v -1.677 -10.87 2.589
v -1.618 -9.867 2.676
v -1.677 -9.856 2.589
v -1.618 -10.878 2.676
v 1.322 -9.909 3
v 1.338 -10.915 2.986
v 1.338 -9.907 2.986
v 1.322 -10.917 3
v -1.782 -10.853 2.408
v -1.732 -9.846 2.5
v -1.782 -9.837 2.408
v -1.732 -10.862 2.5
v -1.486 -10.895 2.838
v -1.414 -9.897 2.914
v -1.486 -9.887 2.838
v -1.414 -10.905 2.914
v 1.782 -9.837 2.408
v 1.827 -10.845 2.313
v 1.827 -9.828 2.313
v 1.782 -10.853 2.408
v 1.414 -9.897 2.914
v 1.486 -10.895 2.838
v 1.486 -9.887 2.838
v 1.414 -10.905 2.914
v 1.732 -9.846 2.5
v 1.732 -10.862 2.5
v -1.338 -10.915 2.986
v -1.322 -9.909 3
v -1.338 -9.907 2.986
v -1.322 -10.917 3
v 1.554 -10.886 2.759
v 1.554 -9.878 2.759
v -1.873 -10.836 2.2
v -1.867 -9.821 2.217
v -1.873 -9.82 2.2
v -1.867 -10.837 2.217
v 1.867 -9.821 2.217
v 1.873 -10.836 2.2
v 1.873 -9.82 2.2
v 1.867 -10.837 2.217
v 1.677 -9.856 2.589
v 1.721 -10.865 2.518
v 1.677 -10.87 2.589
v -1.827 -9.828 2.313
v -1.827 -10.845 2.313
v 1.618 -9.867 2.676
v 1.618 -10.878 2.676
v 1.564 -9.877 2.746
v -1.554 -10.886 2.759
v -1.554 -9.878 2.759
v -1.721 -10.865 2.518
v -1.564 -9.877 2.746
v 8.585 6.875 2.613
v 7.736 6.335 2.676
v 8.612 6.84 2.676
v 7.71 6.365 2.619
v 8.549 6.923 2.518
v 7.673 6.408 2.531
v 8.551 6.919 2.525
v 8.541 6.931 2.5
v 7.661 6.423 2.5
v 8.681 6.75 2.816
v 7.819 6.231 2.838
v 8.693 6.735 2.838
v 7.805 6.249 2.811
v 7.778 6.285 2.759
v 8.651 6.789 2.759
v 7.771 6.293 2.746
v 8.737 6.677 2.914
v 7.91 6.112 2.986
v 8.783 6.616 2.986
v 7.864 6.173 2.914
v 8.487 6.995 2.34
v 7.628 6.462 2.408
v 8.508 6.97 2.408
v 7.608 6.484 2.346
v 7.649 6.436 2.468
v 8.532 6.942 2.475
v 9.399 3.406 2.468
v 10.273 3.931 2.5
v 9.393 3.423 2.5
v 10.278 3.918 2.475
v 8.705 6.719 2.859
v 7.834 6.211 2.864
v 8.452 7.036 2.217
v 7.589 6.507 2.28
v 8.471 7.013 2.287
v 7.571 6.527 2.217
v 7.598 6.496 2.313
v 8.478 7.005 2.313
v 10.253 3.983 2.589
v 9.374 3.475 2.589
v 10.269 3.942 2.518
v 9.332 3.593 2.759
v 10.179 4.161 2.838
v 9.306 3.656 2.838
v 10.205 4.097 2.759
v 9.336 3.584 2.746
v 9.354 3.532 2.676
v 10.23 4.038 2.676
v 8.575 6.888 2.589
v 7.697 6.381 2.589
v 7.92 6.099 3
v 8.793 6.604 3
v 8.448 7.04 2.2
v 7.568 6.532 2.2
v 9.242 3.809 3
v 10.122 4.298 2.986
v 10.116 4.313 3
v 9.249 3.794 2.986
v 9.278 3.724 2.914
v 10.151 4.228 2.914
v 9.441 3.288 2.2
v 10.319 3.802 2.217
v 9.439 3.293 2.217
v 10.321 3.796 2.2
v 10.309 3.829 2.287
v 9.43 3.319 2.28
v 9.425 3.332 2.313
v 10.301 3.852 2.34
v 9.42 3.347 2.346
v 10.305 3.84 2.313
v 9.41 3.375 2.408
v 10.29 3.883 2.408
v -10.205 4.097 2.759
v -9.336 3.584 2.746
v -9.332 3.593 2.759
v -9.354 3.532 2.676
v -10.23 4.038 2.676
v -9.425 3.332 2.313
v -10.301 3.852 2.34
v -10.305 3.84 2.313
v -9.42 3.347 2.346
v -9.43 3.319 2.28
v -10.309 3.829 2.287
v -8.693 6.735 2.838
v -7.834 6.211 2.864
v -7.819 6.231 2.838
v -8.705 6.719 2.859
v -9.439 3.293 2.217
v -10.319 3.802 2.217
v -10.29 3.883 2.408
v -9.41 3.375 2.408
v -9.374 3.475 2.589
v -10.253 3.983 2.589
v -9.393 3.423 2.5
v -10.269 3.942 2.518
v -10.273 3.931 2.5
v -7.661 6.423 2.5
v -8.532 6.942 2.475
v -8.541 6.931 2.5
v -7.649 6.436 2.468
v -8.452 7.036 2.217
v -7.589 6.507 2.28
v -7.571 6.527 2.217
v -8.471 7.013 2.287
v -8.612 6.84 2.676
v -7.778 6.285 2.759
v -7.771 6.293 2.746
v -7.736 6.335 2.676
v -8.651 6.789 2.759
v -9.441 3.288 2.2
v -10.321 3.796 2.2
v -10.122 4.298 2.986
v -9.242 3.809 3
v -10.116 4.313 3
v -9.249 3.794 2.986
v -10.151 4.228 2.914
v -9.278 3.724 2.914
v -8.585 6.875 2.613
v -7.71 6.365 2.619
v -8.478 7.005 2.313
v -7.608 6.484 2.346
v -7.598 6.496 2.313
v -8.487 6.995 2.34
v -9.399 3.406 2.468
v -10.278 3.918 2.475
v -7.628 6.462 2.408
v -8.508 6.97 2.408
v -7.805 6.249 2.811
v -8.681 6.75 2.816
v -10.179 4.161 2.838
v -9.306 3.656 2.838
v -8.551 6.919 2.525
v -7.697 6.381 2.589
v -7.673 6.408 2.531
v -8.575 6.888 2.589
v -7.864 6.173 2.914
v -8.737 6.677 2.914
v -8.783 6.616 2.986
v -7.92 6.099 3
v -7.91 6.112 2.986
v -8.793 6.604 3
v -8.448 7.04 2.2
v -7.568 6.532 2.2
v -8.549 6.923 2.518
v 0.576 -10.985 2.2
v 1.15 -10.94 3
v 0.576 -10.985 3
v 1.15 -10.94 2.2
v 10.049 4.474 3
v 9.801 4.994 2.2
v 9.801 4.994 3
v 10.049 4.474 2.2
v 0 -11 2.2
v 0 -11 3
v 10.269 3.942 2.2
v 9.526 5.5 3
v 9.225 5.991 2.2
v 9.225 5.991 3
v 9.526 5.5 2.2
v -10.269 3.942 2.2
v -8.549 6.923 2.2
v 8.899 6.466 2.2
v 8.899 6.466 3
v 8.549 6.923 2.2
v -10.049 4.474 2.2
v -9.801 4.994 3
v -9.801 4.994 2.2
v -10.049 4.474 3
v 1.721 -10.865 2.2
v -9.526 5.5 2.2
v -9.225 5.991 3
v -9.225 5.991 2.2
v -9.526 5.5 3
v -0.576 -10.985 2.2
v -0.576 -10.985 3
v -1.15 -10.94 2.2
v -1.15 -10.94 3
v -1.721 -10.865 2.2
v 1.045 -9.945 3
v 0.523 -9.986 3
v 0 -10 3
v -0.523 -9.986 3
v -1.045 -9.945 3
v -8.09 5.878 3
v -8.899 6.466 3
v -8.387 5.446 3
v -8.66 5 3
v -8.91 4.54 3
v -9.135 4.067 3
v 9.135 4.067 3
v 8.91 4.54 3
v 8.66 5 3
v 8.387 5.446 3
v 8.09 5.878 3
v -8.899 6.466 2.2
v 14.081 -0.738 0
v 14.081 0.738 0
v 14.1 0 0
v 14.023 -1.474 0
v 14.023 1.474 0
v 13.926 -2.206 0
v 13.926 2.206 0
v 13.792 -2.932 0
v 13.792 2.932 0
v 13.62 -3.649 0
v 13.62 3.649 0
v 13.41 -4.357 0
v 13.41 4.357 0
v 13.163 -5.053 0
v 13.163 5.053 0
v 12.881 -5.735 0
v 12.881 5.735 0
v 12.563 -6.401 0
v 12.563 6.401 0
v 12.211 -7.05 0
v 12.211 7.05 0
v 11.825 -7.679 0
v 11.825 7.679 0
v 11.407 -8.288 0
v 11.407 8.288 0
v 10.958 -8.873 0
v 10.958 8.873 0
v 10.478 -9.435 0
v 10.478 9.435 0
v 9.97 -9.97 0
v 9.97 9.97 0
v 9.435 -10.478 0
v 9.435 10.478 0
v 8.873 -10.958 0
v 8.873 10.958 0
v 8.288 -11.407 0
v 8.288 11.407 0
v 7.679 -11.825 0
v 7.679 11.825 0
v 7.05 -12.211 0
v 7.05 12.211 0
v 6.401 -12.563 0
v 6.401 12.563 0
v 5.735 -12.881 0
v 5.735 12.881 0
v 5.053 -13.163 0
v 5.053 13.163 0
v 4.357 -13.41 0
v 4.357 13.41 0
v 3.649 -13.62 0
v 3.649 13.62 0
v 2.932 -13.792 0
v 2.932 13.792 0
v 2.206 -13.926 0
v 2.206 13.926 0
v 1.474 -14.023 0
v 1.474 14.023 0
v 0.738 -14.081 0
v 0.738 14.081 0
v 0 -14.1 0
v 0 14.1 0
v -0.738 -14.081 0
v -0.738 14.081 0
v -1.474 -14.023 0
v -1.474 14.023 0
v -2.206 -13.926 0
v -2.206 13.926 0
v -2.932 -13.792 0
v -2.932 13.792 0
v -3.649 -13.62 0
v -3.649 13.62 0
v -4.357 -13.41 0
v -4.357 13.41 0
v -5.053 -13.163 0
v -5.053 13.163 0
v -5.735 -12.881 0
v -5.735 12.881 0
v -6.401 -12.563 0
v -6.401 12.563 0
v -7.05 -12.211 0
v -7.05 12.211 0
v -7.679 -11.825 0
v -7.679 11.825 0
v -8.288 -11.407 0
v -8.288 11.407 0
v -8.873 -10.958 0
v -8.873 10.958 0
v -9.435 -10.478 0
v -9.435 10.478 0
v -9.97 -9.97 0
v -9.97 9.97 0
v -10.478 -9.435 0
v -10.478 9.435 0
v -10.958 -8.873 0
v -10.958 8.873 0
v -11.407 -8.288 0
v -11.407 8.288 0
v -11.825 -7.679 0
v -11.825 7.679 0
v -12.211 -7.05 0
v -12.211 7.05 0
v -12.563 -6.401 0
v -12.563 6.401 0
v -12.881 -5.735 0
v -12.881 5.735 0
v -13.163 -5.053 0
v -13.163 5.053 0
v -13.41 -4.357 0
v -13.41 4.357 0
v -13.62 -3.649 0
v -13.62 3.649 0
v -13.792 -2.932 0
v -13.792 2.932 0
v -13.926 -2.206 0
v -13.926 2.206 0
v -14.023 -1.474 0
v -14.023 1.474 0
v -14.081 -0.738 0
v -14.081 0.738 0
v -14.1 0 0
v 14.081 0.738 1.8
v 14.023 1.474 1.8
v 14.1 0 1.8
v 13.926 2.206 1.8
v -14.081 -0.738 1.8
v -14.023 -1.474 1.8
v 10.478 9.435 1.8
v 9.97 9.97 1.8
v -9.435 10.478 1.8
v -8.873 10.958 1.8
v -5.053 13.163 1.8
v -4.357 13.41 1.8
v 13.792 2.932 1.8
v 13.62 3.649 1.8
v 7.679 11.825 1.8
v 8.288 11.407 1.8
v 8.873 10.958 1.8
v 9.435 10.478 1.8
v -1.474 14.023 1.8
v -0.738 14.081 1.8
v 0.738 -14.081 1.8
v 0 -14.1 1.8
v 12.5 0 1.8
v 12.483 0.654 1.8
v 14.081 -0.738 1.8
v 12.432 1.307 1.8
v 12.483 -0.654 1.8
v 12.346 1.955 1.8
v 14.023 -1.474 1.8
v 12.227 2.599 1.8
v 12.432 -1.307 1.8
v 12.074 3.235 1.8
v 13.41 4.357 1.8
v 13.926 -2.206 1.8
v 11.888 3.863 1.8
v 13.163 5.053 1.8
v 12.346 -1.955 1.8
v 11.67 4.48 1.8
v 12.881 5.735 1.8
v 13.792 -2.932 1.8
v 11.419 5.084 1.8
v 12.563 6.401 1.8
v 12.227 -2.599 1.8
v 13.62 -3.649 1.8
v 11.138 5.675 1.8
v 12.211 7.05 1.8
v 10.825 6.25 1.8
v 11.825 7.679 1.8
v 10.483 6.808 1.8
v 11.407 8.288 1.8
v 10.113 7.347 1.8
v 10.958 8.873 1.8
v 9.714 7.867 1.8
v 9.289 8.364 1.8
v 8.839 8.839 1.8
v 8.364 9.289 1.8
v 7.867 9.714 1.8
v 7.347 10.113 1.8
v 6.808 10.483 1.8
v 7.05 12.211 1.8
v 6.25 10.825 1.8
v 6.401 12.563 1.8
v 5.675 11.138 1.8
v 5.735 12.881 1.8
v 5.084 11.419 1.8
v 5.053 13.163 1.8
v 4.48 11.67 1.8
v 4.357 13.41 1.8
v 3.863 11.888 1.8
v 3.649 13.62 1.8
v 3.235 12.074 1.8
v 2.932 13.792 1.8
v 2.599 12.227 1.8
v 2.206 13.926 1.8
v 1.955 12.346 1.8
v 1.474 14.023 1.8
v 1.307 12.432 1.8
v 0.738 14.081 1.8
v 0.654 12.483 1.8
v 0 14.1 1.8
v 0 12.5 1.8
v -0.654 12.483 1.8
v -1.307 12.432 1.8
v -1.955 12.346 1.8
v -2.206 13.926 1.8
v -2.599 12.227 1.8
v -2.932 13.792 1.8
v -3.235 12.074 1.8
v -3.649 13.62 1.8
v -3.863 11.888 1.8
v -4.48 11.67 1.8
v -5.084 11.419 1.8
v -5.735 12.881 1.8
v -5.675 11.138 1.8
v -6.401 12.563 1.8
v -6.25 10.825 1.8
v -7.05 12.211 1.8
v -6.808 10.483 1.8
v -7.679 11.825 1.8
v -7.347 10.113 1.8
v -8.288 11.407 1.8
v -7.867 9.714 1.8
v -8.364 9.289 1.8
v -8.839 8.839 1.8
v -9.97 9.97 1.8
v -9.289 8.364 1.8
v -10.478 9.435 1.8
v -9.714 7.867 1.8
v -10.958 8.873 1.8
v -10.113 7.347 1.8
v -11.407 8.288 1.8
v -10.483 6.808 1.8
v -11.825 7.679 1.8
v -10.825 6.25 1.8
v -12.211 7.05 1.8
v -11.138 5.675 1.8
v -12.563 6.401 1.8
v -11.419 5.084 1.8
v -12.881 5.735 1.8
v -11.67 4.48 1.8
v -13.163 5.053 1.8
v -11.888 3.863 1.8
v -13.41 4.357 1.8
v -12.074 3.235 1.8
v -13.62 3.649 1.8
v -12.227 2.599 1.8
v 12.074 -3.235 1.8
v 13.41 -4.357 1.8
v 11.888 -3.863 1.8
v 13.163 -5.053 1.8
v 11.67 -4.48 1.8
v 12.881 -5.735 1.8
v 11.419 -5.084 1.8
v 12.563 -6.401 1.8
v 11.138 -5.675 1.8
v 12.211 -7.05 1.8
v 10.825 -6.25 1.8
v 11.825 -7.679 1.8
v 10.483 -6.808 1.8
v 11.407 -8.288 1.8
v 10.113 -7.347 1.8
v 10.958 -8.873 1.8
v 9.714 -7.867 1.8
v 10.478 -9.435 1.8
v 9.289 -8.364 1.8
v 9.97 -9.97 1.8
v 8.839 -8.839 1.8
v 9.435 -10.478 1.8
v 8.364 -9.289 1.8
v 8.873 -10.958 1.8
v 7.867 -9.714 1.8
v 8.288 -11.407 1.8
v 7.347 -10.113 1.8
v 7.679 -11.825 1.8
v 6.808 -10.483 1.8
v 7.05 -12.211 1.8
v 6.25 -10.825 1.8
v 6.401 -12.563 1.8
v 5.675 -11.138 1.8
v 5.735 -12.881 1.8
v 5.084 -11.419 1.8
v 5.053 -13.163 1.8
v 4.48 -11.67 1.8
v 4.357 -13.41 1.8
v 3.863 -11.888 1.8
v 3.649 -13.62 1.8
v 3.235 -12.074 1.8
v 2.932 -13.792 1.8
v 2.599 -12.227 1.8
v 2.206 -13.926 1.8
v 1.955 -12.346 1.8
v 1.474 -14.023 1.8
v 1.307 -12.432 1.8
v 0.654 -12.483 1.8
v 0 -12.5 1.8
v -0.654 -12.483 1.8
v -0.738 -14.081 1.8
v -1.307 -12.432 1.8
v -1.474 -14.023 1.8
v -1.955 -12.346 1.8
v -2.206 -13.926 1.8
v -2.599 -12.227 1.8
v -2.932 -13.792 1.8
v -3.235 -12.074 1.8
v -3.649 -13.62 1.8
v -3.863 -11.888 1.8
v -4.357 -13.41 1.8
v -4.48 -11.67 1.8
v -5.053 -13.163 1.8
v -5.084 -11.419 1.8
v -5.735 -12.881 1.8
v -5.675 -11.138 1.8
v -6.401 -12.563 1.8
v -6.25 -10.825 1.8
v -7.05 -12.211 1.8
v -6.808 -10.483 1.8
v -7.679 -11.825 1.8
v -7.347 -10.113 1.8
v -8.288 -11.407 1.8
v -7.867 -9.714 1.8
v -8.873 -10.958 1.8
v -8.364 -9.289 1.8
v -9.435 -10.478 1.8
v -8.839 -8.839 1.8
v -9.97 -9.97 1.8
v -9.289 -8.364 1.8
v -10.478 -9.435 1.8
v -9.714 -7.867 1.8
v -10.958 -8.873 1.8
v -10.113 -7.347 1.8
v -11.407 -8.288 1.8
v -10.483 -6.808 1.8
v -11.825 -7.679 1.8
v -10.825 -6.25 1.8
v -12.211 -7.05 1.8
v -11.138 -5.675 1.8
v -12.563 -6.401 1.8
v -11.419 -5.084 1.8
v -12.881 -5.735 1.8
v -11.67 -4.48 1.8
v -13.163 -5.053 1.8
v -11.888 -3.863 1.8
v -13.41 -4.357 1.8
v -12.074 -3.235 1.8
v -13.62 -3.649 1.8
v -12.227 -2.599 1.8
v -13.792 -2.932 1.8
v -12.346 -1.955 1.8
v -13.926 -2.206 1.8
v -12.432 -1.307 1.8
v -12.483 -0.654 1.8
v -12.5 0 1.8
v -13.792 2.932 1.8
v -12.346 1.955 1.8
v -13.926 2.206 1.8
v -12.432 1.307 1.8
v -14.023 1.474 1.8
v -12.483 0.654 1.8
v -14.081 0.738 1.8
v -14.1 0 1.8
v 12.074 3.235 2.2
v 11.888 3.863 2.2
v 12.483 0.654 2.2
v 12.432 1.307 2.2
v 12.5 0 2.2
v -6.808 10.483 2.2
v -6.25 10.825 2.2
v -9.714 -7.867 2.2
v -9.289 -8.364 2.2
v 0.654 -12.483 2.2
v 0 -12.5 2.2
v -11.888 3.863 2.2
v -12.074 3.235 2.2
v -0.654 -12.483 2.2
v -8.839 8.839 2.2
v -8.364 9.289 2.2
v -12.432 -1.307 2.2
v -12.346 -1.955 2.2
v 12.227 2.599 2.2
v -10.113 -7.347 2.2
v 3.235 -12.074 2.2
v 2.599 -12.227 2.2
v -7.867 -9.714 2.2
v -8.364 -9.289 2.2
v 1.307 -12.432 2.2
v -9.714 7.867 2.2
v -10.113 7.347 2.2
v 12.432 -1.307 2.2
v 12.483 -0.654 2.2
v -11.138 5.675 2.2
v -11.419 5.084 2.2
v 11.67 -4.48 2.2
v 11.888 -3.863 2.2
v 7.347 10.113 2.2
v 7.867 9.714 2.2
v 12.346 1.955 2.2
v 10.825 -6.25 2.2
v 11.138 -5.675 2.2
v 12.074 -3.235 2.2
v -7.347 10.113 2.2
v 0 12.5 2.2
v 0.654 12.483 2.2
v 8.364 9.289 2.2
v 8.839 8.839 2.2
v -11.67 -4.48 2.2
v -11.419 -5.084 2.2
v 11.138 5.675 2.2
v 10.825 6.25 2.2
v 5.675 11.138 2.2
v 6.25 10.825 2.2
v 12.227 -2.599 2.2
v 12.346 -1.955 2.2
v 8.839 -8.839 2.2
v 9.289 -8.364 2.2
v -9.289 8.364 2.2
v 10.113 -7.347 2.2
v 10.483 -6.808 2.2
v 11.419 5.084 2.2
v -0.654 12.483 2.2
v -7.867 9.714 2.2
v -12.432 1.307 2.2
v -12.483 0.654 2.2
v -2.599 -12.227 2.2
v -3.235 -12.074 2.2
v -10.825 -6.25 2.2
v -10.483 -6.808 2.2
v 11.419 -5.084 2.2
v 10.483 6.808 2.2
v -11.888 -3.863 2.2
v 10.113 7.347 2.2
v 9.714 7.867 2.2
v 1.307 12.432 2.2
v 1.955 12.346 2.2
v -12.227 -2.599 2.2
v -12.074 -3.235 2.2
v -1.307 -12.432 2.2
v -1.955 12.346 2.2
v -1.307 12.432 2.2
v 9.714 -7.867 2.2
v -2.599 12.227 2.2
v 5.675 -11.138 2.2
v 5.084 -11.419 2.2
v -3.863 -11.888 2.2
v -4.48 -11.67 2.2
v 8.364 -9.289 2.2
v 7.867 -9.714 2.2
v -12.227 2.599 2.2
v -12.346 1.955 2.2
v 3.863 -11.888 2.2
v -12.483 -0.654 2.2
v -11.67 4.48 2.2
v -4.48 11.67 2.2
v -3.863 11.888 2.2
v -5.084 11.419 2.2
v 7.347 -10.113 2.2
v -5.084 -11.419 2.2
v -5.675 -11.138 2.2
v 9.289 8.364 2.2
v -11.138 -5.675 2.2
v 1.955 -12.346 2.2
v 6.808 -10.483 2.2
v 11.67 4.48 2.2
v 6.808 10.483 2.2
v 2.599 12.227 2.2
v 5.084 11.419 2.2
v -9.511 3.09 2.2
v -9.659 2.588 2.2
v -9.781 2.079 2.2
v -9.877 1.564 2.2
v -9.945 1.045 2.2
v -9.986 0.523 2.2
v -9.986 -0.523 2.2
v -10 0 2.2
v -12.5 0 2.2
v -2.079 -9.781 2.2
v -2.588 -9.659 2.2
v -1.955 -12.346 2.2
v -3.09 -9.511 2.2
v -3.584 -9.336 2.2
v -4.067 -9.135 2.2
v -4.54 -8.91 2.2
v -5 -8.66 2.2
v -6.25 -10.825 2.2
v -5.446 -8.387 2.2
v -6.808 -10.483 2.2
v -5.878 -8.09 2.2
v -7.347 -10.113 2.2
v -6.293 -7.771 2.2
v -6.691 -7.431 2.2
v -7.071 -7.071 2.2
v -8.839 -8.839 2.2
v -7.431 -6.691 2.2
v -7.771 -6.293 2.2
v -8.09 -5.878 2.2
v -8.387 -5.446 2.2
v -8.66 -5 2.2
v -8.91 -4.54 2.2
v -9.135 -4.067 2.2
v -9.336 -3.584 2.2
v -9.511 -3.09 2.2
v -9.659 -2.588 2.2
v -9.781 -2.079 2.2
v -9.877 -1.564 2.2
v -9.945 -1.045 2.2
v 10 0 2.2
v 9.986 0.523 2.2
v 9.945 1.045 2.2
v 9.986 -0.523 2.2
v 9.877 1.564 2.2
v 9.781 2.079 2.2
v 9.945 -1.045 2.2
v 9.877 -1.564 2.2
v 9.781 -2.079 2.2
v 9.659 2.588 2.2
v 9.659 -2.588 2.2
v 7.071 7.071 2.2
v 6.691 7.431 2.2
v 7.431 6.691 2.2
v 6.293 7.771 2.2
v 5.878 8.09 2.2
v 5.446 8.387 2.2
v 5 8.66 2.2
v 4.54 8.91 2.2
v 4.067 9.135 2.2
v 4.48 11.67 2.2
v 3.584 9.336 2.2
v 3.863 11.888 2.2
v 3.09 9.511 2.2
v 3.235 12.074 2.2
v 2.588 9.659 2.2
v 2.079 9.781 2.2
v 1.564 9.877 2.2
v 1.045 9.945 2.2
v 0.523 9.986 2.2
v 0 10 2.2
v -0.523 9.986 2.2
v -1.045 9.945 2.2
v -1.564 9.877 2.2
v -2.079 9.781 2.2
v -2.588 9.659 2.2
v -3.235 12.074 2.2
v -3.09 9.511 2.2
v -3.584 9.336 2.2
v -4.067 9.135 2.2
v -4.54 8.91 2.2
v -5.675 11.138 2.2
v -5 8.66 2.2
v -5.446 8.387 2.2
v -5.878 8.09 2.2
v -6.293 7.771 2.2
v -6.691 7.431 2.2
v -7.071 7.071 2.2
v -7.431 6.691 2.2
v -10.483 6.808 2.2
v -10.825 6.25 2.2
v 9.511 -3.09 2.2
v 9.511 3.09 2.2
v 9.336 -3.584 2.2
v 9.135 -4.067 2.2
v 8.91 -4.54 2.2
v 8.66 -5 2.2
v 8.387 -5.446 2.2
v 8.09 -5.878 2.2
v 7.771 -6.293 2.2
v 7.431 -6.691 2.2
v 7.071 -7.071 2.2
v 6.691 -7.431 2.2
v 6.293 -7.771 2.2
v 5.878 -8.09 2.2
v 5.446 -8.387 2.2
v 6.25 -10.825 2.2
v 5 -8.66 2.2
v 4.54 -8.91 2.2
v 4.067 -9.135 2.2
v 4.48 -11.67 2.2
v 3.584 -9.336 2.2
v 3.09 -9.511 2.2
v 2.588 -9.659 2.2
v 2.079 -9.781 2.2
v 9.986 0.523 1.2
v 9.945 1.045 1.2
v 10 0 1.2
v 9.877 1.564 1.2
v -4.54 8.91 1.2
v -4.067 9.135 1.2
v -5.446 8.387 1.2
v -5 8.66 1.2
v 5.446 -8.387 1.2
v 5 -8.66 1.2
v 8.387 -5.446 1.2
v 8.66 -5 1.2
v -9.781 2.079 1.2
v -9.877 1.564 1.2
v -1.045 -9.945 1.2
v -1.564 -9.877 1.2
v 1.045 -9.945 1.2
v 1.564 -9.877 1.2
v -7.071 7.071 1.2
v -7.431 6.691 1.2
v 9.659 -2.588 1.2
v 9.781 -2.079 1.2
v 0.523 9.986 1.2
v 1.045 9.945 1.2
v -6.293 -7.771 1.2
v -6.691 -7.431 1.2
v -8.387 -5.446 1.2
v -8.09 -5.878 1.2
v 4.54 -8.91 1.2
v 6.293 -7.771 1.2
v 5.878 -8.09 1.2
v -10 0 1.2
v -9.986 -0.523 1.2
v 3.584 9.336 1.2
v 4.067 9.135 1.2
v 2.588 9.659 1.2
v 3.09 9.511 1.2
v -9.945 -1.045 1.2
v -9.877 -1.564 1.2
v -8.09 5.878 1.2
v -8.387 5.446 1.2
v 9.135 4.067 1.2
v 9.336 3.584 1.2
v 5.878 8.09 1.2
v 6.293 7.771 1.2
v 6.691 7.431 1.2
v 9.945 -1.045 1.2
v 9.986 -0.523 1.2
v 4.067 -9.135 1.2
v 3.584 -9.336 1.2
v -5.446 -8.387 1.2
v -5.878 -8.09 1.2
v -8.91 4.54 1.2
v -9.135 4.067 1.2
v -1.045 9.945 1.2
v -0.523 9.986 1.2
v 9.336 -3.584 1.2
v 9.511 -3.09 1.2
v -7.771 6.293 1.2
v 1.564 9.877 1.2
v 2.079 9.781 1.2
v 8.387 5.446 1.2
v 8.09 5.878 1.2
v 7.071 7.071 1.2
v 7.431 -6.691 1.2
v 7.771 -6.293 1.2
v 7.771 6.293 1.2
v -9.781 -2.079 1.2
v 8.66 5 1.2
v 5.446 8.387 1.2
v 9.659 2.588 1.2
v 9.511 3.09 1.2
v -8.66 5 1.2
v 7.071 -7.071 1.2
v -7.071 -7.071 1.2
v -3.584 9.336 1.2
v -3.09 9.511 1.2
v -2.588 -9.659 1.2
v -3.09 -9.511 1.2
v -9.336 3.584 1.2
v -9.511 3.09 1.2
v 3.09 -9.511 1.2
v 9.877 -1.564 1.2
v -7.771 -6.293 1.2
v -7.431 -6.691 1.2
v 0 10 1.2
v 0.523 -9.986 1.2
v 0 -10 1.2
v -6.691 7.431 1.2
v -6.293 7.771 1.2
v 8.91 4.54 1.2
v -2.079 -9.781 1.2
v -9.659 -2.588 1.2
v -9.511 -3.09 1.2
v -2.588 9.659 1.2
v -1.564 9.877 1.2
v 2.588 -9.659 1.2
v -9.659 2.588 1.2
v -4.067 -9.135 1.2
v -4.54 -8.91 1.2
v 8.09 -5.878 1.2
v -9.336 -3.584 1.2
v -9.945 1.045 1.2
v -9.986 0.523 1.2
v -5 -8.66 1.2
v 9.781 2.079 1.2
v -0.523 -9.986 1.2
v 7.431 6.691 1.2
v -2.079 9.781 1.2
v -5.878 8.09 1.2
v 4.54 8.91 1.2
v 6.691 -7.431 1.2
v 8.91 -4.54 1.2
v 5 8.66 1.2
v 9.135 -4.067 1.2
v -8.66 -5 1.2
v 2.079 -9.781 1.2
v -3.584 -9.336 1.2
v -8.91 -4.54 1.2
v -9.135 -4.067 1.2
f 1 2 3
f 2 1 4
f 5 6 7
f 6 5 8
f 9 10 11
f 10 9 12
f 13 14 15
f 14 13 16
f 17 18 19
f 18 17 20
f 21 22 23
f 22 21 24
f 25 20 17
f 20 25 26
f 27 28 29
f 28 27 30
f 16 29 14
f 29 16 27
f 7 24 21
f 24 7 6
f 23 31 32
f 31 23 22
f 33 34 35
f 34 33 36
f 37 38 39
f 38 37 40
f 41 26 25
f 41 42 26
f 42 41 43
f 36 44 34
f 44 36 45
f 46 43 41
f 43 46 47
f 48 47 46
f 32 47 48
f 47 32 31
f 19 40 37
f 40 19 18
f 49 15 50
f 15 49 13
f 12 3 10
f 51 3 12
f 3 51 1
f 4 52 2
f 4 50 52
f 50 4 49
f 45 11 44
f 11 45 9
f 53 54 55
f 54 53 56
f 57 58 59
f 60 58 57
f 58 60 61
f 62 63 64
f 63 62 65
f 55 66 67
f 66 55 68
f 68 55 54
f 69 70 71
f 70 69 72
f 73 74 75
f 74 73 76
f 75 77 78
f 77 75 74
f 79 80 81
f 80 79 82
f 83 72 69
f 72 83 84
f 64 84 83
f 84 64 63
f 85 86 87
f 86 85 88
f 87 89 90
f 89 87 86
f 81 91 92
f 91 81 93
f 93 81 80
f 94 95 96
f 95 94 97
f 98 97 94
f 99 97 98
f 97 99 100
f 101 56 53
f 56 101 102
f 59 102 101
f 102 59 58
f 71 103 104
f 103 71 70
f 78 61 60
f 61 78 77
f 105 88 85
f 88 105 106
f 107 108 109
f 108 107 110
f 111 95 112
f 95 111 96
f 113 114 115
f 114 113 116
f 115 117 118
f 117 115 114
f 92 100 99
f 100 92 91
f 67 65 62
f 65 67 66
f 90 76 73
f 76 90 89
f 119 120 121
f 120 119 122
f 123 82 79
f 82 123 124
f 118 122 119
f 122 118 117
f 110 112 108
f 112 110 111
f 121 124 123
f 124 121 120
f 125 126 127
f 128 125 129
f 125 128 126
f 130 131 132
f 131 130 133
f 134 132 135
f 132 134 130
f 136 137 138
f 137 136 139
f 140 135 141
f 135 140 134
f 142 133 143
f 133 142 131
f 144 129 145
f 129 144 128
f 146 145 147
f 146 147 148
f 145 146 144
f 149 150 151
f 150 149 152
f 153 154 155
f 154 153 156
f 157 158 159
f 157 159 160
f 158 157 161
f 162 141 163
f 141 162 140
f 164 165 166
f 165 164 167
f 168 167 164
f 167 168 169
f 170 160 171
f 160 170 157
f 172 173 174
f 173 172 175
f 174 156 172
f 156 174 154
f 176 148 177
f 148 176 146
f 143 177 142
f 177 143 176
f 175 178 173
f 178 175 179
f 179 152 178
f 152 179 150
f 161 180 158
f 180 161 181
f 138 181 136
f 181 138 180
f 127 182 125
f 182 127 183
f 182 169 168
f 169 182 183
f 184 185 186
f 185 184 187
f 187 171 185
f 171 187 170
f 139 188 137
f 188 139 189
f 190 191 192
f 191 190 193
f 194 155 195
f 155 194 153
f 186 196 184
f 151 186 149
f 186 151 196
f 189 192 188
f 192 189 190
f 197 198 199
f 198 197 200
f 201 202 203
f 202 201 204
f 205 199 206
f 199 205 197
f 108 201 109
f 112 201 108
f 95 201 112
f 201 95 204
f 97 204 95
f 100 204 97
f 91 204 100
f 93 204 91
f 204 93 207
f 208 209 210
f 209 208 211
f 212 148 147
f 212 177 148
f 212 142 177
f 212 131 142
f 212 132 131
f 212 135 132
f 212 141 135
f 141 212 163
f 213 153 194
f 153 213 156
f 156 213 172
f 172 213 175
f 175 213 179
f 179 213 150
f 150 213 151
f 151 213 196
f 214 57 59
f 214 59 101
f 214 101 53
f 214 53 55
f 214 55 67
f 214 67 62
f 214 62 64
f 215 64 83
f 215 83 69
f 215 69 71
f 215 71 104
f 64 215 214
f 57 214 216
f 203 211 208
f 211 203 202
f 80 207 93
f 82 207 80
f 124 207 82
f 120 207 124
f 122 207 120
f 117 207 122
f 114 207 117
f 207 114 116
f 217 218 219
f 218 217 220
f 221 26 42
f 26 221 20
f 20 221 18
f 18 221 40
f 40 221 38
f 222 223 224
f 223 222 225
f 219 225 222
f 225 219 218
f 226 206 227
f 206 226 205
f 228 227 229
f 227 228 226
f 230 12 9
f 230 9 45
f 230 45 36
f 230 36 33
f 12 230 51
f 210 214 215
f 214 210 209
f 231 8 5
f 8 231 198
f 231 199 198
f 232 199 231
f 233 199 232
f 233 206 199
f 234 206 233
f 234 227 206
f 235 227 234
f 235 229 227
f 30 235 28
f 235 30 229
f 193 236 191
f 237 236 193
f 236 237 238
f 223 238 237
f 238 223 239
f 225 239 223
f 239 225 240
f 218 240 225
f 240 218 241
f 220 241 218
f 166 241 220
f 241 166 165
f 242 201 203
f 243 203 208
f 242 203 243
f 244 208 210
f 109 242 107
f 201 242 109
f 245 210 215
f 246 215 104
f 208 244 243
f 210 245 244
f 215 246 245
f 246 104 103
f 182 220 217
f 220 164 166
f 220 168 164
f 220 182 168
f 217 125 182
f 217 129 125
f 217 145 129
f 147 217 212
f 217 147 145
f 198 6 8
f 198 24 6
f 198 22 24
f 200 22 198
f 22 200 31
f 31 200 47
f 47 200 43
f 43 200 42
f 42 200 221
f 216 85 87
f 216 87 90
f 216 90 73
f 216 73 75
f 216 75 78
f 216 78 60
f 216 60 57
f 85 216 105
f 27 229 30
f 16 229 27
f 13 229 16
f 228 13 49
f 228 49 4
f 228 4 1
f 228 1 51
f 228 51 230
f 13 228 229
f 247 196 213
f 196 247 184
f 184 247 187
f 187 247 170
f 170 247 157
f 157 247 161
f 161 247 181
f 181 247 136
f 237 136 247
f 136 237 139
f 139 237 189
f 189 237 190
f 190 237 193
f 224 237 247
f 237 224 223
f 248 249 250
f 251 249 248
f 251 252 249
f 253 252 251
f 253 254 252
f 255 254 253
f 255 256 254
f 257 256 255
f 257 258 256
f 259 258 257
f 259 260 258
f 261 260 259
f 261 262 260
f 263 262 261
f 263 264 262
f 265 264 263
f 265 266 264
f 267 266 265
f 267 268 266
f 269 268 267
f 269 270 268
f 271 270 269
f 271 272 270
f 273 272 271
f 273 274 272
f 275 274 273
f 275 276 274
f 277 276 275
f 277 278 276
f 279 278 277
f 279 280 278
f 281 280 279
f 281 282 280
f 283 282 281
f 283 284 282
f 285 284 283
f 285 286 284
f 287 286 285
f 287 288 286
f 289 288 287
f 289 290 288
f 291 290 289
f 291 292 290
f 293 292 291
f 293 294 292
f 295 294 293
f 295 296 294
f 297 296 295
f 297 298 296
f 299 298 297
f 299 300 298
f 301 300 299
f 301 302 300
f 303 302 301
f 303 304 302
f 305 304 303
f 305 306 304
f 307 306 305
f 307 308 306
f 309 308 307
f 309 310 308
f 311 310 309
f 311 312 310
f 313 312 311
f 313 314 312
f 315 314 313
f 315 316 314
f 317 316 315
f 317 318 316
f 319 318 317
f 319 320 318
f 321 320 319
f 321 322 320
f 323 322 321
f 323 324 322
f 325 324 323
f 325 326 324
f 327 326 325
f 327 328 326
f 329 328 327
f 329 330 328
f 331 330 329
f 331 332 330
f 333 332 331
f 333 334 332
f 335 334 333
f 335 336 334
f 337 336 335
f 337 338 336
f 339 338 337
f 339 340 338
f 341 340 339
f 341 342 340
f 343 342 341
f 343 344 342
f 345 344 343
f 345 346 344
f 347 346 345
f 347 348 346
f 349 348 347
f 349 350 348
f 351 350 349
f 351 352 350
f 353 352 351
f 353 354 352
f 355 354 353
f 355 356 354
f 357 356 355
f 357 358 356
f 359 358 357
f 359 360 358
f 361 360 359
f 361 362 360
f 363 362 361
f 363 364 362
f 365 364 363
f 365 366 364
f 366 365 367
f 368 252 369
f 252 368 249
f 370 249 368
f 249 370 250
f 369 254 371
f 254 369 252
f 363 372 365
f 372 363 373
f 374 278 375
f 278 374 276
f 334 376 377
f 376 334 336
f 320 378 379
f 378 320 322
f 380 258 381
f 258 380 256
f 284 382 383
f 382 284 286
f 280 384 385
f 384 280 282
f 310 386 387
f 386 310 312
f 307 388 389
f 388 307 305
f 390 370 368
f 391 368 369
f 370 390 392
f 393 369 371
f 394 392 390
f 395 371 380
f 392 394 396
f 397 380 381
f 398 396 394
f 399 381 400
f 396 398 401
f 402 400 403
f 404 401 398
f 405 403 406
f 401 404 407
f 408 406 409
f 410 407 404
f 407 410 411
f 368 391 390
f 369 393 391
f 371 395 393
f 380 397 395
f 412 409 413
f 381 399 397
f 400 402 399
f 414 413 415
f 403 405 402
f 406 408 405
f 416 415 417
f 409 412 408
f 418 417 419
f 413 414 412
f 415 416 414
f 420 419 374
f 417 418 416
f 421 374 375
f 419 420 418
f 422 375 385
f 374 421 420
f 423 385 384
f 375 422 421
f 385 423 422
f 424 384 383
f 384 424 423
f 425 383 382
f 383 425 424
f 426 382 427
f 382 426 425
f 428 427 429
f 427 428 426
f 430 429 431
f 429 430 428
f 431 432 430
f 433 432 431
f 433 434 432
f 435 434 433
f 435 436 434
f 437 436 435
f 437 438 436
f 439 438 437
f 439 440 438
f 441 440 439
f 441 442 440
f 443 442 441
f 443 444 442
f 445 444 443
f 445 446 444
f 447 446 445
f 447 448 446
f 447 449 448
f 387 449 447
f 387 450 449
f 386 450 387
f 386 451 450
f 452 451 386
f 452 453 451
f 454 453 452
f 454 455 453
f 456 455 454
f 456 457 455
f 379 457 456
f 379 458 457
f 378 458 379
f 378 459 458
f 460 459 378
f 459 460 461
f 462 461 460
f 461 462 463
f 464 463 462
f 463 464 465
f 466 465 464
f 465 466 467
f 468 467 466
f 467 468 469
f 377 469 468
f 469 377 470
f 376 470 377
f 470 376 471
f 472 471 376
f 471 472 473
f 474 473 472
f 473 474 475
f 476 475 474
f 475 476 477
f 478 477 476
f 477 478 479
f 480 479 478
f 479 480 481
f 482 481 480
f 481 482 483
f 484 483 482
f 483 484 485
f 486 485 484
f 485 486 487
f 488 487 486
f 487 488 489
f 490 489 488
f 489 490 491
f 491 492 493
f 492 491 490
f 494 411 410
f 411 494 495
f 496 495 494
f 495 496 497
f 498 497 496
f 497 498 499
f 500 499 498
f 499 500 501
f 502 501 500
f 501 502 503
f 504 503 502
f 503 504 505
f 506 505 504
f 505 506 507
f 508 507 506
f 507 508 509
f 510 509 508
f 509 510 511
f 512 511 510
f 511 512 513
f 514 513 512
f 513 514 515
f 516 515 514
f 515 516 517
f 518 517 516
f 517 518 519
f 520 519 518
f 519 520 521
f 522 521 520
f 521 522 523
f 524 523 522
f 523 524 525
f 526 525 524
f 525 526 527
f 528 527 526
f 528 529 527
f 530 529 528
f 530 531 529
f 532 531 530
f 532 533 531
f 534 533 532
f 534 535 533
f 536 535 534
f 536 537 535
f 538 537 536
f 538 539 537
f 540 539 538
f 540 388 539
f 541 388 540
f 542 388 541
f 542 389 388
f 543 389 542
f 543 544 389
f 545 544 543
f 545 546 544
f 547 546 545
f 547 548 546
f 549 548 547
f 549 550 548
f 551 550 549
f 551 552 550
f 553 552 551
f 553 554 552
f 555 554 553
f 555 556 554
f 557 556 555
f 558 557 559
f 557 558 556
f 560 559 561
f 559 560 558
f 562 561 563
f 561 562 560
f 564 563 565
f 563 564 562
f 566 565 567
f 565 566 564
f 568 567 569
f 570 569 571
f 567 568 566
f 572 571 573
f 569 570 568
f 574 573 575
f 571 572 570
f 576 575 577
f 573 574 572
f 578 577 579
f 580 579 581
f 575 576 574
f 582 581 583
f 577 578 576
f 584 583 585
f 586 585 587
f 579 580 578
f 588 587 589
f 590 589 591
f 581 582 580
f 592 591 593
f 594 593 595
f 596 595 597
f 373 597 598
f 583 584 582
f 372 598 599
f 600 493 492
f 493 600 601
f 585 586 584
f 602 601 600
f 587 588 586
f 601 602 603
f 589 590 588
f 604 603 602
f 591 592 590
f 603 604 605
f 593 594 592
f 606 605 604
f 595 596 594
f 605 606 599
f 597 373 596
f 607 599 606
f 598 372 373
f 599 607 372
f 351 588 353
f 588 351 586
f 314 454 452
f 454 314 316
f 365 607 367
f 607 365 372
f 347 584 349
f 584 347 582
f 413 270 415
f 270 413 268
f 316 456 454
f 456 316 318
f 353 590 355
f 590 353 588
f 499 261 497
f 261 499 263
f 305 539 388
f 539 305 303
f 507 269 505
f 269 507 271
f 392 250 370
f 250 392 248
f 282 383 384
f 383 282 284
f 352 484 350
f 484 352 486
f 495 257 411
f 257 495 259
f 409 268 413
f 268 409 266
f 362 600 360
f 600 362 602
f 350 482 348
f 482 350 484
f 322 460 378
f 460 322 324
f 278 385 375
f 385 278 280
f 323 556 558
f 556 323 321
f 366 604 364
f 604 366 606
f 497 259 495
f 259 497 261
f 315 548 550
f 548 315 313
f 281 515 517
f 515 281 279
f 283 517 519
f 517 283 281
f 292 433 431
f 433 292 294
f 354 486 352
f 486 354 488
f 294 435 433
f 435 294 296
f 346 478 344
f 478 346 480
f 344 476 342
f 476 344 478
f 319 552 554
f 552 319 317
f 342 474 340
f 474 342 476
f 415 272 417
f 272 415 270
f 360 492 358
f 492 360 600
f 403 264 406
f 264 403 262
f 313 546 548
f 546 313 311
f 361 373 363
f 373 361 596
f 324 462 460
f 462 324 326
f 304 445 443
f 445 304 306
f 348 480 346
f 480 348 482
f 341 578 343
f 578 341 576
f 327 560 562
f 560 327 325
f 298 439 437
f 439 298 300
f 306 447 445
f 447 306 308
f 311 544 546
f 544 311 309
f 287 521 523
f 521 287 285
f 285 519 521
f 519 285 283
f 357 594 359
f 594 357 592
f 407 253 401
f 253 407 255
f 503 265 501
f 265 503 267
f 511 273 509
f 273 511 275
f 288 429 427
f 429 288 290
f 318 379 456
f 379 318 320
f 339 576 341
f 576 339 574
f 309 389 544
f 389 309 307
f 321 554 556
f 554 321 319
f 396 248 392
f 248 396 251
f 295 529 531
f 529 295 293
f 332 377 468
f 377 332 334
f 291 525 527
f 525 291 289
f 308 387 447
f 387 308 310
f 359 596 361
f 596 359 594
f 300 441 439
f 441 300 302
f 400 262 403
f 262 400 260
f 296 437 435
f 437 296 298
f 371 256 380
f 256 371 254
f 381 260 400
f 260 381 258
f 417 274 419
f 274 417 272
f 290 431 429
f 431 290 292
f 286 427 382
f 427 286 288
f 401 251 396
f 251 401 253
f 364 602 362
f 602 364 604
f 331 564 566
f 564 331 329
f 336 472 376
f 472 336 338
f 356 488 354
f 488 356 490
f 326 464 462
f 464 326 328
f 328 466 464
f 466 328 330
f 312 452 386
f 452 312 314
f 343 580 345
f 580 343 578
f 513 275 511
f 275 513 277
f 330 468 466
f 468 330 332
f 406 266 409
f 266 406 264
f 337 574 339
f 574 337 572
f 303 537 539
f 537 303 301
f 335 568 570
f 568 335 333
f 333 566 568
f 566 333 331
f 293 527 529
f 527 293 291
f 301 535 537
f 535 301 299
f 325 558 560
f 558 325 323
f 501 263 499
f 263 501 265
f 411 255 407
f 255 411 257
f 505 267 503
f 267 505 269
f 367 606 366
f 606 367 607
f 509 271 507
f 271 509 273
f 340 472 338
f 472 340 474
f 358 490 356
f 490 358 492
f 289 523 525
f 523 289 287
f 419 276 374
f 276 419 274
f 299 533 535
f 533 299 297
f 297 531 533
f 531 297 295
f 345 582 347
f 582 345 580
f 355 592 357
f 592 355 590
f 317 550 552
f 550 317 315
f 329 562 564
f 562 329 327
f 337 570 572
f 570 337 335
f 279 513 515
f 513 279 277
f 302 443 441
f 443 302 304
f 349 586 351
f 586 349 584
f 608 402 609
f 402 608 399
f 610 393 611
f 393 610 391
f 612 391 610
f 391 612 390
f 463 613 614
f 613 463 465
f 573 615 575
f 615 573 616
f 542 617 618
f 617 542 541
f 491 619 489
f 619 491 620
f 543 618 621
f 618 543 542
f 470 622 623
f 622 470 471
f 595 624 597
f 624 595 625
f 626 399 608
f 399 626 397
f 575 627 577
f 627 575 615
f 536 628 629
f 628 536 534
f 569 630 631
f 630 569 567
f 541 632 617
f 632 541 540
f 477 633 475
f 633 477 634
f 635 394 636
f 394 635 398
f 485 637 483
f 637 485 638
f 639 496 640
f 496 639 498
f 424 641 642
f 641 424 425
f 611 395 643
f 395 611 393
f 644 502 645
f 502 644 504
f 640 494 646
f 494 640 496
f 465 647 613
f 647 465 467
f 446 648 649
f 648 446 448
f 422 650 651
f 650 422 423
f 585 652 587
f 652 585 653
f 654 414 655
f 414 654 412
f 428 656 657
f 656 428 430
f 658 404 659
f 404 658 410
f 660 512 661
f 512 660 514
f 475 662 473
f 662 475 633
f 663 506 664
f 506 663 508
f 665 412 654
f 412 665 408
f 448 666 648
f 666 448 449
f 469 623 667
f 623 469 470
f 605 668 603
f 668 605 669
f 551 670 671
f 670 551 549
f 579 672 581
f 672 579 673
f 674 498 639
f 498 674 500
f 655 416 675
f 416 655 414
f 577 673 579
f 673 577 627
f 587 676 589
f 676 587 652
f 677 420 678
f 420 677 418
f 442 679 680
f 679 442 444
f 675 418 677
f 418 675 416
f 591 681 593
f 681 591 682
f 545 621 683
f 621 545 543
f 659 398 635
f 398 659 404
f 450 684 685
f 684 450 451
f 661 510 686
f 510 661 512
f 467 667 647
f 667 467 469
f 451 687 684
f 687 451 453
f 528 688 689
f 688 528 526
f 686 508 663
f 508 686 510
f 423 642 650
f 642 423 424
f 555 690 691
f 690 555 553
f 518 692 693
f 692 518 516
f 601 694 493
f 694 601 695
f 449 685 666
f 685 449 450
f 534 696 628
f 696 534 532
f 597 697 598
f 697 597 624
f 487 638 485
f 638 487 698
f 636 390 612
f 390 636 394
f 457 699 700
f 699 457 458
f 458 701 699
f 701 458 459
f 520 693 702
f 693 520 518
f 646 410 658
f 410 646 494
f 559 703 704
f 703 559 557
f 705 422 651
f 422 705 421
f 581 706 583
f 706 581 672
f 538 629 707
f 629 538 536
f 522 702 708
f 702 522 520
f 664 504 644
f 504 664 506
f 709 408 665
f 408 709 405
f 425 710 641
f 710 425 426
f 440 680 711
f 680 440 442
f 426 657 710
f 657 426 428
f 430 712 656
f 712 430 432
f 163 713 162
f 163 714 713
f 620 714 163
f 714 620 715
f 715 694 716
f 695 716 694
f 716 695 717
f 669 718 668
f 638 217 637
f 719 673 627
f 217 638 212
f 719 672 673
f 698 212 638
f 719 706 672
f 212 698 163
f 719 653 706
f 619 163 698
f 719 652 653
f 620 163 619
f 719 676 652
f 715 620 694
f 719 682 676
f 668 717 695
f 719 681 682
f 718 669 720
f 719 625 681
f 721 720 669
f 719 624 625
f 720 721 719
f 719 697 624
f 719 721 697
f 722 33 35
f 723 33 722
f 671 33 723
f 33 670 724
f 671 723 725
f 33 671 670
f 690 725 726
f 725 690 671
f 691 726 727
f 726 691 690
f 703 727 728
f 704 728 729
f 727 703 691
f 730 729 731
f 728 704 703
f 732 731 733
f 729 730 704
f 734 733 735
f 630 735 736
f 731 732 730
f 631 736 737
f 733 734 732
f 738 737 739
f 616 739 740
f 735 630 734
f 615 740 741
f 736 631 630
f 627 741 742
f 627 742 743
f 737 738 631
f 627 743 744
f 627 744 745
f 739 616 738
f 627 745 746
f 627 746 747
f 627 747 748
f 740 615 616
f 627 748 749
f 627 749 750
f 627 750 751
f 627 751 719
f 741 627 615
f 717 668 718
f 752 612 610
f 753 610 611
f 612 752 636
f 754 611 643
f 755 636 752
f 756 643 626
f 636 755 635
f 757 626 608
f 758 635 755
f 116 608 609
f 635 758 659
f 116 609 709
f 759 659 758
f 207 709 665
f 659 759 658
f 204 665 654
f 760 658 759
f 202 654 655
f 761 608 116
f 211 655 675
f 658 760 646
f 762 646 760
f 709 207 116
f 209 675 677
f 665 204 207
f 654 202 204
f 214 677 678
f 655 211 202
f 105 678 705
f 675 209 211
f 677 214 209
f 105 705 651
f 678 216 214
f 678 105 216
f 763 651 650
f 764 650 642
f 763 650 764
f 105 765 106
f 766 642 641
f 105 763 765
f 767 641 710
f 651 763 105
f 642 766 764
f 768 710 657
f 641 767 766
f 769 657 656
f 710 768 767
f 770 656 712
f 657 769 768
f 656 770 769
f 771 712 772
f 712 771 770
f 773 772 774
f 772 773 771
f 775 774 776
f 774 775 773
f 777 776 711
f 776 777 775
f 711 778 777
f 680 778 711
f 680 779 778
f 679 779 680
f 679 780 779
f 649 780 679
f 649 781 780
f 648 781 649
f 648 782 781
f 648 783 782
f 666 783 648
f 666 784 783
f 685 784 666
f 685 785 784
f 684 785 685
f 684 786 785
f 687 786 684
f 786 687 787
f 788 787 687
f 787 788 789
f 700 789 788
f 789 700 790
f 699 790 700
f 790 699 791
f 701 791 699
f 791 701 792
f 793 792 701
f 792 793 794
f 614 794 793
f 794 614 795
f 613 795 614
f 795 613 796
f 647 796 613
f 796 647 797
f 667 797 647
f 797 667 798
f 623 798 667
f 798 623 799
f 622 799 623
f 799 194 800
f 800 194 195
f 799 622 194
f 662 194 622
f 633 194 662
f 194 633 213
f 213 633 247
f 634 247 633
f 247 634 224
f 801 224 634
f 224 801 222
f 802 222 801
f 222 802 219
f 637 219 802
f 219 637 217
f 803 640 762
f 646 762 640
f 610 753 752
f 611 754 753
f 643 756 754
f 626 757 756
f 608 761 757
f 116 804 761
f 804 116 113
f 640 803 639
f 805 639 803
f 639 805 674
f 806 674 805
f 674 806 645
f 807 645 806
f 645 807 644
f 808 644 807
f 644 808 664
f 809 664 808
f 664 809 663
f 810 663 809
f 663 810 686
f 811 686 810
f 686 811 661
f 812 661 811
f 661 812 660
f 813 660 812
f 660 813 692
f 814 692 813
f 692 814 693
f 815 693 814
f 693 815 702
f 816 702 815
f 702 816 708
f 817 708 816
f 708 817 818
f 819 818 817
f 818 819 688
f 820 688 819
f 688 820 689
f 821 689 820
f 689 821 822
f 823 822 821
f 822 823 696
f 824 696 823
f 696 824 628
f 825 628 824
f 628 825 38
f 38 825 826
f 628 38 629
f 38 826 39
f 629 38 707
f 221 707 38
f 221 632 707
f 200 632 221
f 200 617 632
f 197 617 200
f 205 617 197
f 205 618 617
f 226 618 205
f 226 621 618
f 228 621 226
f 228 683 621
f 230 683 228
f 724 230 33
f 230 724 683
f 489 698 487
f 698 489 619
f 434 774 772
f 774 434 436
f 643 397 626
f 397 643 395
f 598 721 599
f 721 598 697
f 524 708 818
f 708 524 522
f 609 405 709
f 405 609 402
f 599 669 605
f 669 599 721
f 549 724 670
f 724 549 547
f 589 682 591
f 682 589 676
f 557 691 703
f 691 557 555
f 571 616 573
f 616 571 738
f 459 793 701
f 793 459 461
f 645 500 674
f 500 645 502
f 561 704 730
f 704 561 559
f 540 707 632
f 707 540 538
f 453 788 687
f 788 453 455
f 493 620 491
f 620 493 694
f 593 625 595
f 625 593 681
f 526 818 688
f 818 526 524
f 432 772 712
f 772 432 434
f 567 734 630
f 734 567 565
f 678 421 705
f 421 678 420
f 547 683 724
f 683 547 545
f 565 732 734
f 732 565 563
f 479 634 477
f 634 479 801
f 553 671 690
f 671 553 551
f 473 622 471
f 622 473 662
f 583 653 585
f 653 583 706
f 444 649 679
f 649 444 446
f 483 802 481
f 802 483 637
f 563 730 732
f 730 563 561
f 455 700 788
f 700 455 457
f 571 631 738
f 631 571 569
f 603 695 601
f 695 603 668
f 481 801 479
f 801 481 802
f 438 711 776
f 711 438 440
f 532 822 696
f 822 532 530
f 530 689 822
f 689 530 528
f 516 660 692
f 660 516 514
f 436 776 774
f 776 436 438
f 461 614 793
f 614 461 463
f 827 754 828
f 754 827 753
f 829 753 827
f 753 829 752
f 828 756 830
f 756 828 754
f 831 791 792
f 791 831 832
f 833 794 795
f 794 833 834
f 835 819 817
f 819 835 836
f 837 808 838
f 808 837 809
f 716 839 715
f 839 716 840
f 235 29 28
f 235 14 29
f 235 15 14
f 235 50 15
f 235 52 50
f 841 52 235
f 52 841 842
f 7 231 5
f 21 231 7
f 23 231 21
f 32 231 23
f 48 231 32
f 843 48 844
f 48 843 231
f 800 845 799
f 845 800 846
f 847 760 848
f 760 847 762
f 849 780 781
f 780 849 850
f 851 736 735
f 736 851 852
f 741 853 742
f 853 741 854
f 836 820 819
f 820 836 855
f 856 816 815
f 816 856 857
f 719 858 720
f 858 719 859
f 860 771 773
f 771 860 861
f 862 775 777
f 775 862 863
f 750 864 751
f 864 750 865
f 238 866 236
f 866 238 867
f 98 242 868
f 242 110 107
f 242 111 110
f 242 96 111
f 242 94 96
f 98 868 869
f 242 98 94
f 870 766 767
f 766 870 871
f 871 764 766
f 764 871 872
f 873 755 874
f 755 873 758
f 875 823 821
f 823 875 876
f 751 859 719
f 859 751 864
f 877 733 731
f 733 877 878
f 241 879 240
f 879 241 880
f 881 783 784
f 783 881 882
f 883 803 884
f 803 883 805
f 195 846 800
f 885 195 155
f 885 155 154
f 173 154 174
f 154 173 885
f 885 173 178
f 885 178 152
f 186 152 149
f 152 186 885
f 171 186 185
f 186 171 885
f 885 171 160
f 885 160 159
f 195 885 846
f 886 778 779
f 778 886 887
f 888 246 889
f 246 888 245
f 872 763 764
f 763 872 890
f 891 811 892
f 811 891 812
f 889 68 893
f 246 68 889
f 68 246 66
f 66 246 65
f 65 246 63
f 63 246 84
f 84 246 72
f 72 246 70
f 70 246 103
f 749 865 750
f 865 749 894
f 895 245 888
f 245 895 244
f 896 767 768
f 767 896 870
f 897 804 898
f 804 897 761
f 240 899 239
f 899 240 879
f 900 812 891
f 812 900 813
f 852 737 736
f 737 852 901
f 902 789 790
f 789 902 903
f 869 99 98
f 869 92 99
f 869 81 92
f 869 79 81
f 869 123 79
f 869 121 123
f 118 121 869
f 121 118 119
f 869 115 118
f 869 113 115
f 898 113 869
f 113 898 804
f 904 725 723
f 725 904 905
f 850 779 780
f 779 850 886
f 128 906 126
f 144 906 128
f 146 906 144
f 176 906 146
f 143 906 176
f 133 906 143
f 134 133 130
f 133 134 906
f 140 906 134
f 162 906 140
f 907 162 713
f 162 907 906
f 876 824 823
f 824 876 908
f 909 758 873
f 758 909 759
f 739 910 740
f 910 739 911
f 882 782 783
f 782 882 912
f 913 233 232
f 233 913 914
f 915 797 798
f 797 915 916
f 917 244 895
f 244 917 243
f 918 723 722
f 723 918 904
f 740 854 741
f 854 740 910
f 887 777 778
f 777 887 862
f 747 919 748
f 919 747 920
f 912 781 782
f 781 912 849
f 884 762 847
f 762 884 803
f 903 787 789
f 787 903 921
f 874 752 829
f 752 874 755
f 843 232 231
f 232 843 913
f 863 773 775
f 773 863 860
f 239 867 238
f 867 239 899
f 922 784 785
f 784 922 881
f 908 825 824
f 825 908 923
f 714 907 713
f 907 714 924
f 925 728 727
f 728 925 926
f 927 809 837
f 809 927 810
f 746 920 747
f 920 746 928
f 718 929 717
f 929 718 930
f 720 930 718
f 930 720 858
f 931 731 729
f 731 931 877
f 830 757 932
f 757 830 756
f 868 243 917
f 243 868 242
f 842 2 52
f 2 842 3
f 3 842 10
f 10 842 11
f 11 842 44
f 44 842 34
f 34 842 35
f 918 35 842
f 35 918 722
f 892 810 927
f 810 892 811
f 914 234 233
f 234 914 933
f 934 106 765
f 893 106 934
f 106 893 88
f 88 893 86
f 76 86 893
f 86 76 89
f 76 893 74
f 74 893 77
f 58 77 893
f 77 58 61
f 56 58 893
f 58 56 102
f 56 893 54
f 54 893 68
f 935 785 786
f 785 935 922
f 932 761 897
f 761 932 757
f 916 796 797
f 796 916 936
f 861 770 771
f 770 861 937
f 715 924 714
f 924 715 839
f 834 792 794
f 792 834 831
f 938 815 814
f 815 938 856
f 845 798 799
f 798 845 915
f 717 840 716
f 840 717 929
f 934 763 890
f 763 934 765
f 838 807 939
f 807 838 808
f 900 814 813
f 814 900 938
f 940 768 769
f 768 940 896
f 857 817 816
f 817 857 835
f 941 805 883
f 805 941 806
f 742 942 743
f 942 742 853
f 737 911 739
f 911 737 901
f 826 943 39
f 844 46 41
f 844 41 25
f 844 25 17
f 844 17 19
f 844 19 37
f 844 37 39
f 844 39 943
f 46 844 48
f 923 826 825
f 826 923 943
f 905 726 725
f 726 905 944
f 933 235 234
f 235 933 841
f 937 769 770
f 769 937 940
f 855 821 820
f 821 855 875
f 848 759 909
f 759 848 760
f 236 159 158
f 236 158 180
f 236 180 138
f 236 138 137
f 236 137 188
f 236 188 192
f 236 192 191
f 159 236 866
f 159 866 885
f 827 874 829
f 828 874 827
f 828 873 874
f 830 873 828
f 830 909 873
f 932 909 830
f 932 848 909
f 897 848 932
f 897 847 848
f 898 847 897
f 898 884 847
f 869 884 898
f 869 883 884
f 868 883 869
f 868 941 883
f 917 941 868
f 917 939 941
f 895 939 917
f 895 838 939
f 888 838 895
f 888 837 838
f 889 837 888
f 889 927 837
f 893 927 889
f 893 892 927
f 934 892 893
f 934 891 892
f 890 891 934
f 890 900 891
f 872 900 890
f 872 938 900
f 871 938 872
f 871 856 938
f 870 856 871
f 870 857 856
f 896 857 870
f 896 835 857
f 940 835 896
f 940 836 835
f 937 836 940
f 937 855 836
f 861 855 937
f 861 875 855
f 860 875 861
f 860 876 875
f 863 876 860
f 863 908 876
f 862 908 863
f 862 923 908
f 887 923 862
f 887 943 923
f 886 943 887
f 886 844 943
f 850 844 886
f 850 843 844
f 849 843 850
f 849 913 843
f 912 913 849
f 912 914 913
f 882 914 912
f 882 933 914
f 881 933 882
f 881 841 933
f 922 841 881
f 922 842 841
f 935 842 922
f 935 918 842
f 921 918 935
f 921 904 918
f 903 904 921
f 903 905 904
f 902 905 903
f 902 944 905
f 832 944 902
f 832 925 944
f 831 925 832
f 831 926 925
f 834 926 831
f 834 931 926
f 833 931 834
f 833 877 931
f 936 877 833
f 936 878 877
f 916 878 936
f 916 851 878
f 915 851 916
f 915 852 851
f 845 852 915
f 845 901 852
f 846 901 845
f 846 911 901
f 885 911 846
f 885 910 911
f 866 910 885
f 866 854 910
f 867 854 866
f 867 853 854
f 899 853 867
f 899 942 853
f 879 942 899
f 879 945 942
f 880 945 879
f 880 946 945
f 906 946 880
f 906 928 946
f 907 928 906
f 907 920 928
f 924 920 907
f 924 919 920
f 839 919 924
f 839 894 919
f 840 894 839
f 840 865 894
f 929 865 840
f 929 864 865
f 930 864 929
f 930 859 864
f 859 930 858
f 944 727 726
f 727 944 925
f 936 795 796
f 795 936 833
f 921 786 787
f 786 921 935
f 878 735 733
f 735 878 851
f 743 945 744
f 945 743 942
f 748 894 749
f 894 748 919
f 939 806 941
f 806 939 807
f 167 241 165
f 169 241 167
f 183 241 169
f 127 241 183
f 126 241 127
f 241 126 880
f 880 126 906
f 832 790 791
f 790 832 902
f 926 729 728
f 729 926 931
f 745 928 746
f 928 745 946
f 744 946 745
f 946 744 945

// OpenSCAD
$fn=120;
rad = 25/2+0.0;
ht  = 4.75;
angle = 25;

% translate([0,0,2.2]) ring2();
elite();

module elite() {
   difference() {
      union() {
         cylinder(h=1.8,r=rad+1.6);
         cylinder(h=2.2,r=rad);

         intersection() {
            union() for (i=[0,120,240]) {
	         rotate([0,0,i]) translate([0,0,1.5]) rotate([90,0,0]) cylinder(r=2,h=15);
            }
            cylinder(h=3,r=rad-1.5);
         }
      }
      translate([0,0,1.2]) cylinder(h=10,r=rad-2.5);
   }
}

module ring2() {
   if (1) difference() {
      union() {
         hull() {
            for (i=[0:1]) {
               rotate([0,0,i*180]) translate([rad+1,-3.5,-1.0]) rotate([0,-1*angle,0]) cube([2,7,0.91+1.5]);
            }
            // cylinder(h=0.91+1.5, r=rad+1.6);
            cylinder(h=0.91+1.5, r=rad+1.6);
         }

         for (i=[0:1]) {
            rotate([0,0,i*180]) translate([rad+1,-3.5,-1.0]) rotate([0,-1*angle,0]) cube([2,7,ht+2]);
         }
         cylinder(h=0.91+1.5, r=rad+1.6);
      }

      /* cut down to base shape */
      translate([0,0,0.91]) cylinder(h=10,r=rad+0.4);
      translate([0,0,-0.1]) cylinder(h=10,r=rad-1.5);
      translate([0,0,ht]) cylinder(h=10,r=rad+5);
      translate([0,0,-2]) cylinder(h=2,r=rad+5);
   }

   // add back in the posts
   intersection() {
      for (i=[0:1]) {
         rotate([0,0,i*180-11]) translate([rad+1,0,0]) rotate([0,-4,0]) cylinder(r=1,h=ht+1);
         rotate([0,0,i*180+11]) translate([rad+1,0,0]) rotate([0,-4,0]) cylinder(r=1,h=ht+1);
         rotate([0,0,i*180]) translate([rad+1.75,-3.5,-0.5]) rotate([0,-1*angle,0]) cube([1,7,ht+3]);
      }
      translate([0,0,0.91+1.5]) cylinder(r=rad+0.5,h=ht-0.91-1.5);
   }

   difference() {
      intersection() {
         for (i=[0:1]) {
            rotate([0,0,i*180-11]) translate([rad+2,0,0]) rotate([0,-24,0]) cylinder(r=1,h=ht+1);
            rotate([0,0,i*180+11]) translate([rad+2.0,0,0]) rotate([0,-24,0]) cylinder(r=1,h=ht+1);
         }
         cylinder(r=rad+1,h=10);
      }
      translate([0,0,2.41]) cylinder(r=rad+5,h=10);
      translate([0,0,-2]) cylinder(r=rad+5,h=2);
   }
}
